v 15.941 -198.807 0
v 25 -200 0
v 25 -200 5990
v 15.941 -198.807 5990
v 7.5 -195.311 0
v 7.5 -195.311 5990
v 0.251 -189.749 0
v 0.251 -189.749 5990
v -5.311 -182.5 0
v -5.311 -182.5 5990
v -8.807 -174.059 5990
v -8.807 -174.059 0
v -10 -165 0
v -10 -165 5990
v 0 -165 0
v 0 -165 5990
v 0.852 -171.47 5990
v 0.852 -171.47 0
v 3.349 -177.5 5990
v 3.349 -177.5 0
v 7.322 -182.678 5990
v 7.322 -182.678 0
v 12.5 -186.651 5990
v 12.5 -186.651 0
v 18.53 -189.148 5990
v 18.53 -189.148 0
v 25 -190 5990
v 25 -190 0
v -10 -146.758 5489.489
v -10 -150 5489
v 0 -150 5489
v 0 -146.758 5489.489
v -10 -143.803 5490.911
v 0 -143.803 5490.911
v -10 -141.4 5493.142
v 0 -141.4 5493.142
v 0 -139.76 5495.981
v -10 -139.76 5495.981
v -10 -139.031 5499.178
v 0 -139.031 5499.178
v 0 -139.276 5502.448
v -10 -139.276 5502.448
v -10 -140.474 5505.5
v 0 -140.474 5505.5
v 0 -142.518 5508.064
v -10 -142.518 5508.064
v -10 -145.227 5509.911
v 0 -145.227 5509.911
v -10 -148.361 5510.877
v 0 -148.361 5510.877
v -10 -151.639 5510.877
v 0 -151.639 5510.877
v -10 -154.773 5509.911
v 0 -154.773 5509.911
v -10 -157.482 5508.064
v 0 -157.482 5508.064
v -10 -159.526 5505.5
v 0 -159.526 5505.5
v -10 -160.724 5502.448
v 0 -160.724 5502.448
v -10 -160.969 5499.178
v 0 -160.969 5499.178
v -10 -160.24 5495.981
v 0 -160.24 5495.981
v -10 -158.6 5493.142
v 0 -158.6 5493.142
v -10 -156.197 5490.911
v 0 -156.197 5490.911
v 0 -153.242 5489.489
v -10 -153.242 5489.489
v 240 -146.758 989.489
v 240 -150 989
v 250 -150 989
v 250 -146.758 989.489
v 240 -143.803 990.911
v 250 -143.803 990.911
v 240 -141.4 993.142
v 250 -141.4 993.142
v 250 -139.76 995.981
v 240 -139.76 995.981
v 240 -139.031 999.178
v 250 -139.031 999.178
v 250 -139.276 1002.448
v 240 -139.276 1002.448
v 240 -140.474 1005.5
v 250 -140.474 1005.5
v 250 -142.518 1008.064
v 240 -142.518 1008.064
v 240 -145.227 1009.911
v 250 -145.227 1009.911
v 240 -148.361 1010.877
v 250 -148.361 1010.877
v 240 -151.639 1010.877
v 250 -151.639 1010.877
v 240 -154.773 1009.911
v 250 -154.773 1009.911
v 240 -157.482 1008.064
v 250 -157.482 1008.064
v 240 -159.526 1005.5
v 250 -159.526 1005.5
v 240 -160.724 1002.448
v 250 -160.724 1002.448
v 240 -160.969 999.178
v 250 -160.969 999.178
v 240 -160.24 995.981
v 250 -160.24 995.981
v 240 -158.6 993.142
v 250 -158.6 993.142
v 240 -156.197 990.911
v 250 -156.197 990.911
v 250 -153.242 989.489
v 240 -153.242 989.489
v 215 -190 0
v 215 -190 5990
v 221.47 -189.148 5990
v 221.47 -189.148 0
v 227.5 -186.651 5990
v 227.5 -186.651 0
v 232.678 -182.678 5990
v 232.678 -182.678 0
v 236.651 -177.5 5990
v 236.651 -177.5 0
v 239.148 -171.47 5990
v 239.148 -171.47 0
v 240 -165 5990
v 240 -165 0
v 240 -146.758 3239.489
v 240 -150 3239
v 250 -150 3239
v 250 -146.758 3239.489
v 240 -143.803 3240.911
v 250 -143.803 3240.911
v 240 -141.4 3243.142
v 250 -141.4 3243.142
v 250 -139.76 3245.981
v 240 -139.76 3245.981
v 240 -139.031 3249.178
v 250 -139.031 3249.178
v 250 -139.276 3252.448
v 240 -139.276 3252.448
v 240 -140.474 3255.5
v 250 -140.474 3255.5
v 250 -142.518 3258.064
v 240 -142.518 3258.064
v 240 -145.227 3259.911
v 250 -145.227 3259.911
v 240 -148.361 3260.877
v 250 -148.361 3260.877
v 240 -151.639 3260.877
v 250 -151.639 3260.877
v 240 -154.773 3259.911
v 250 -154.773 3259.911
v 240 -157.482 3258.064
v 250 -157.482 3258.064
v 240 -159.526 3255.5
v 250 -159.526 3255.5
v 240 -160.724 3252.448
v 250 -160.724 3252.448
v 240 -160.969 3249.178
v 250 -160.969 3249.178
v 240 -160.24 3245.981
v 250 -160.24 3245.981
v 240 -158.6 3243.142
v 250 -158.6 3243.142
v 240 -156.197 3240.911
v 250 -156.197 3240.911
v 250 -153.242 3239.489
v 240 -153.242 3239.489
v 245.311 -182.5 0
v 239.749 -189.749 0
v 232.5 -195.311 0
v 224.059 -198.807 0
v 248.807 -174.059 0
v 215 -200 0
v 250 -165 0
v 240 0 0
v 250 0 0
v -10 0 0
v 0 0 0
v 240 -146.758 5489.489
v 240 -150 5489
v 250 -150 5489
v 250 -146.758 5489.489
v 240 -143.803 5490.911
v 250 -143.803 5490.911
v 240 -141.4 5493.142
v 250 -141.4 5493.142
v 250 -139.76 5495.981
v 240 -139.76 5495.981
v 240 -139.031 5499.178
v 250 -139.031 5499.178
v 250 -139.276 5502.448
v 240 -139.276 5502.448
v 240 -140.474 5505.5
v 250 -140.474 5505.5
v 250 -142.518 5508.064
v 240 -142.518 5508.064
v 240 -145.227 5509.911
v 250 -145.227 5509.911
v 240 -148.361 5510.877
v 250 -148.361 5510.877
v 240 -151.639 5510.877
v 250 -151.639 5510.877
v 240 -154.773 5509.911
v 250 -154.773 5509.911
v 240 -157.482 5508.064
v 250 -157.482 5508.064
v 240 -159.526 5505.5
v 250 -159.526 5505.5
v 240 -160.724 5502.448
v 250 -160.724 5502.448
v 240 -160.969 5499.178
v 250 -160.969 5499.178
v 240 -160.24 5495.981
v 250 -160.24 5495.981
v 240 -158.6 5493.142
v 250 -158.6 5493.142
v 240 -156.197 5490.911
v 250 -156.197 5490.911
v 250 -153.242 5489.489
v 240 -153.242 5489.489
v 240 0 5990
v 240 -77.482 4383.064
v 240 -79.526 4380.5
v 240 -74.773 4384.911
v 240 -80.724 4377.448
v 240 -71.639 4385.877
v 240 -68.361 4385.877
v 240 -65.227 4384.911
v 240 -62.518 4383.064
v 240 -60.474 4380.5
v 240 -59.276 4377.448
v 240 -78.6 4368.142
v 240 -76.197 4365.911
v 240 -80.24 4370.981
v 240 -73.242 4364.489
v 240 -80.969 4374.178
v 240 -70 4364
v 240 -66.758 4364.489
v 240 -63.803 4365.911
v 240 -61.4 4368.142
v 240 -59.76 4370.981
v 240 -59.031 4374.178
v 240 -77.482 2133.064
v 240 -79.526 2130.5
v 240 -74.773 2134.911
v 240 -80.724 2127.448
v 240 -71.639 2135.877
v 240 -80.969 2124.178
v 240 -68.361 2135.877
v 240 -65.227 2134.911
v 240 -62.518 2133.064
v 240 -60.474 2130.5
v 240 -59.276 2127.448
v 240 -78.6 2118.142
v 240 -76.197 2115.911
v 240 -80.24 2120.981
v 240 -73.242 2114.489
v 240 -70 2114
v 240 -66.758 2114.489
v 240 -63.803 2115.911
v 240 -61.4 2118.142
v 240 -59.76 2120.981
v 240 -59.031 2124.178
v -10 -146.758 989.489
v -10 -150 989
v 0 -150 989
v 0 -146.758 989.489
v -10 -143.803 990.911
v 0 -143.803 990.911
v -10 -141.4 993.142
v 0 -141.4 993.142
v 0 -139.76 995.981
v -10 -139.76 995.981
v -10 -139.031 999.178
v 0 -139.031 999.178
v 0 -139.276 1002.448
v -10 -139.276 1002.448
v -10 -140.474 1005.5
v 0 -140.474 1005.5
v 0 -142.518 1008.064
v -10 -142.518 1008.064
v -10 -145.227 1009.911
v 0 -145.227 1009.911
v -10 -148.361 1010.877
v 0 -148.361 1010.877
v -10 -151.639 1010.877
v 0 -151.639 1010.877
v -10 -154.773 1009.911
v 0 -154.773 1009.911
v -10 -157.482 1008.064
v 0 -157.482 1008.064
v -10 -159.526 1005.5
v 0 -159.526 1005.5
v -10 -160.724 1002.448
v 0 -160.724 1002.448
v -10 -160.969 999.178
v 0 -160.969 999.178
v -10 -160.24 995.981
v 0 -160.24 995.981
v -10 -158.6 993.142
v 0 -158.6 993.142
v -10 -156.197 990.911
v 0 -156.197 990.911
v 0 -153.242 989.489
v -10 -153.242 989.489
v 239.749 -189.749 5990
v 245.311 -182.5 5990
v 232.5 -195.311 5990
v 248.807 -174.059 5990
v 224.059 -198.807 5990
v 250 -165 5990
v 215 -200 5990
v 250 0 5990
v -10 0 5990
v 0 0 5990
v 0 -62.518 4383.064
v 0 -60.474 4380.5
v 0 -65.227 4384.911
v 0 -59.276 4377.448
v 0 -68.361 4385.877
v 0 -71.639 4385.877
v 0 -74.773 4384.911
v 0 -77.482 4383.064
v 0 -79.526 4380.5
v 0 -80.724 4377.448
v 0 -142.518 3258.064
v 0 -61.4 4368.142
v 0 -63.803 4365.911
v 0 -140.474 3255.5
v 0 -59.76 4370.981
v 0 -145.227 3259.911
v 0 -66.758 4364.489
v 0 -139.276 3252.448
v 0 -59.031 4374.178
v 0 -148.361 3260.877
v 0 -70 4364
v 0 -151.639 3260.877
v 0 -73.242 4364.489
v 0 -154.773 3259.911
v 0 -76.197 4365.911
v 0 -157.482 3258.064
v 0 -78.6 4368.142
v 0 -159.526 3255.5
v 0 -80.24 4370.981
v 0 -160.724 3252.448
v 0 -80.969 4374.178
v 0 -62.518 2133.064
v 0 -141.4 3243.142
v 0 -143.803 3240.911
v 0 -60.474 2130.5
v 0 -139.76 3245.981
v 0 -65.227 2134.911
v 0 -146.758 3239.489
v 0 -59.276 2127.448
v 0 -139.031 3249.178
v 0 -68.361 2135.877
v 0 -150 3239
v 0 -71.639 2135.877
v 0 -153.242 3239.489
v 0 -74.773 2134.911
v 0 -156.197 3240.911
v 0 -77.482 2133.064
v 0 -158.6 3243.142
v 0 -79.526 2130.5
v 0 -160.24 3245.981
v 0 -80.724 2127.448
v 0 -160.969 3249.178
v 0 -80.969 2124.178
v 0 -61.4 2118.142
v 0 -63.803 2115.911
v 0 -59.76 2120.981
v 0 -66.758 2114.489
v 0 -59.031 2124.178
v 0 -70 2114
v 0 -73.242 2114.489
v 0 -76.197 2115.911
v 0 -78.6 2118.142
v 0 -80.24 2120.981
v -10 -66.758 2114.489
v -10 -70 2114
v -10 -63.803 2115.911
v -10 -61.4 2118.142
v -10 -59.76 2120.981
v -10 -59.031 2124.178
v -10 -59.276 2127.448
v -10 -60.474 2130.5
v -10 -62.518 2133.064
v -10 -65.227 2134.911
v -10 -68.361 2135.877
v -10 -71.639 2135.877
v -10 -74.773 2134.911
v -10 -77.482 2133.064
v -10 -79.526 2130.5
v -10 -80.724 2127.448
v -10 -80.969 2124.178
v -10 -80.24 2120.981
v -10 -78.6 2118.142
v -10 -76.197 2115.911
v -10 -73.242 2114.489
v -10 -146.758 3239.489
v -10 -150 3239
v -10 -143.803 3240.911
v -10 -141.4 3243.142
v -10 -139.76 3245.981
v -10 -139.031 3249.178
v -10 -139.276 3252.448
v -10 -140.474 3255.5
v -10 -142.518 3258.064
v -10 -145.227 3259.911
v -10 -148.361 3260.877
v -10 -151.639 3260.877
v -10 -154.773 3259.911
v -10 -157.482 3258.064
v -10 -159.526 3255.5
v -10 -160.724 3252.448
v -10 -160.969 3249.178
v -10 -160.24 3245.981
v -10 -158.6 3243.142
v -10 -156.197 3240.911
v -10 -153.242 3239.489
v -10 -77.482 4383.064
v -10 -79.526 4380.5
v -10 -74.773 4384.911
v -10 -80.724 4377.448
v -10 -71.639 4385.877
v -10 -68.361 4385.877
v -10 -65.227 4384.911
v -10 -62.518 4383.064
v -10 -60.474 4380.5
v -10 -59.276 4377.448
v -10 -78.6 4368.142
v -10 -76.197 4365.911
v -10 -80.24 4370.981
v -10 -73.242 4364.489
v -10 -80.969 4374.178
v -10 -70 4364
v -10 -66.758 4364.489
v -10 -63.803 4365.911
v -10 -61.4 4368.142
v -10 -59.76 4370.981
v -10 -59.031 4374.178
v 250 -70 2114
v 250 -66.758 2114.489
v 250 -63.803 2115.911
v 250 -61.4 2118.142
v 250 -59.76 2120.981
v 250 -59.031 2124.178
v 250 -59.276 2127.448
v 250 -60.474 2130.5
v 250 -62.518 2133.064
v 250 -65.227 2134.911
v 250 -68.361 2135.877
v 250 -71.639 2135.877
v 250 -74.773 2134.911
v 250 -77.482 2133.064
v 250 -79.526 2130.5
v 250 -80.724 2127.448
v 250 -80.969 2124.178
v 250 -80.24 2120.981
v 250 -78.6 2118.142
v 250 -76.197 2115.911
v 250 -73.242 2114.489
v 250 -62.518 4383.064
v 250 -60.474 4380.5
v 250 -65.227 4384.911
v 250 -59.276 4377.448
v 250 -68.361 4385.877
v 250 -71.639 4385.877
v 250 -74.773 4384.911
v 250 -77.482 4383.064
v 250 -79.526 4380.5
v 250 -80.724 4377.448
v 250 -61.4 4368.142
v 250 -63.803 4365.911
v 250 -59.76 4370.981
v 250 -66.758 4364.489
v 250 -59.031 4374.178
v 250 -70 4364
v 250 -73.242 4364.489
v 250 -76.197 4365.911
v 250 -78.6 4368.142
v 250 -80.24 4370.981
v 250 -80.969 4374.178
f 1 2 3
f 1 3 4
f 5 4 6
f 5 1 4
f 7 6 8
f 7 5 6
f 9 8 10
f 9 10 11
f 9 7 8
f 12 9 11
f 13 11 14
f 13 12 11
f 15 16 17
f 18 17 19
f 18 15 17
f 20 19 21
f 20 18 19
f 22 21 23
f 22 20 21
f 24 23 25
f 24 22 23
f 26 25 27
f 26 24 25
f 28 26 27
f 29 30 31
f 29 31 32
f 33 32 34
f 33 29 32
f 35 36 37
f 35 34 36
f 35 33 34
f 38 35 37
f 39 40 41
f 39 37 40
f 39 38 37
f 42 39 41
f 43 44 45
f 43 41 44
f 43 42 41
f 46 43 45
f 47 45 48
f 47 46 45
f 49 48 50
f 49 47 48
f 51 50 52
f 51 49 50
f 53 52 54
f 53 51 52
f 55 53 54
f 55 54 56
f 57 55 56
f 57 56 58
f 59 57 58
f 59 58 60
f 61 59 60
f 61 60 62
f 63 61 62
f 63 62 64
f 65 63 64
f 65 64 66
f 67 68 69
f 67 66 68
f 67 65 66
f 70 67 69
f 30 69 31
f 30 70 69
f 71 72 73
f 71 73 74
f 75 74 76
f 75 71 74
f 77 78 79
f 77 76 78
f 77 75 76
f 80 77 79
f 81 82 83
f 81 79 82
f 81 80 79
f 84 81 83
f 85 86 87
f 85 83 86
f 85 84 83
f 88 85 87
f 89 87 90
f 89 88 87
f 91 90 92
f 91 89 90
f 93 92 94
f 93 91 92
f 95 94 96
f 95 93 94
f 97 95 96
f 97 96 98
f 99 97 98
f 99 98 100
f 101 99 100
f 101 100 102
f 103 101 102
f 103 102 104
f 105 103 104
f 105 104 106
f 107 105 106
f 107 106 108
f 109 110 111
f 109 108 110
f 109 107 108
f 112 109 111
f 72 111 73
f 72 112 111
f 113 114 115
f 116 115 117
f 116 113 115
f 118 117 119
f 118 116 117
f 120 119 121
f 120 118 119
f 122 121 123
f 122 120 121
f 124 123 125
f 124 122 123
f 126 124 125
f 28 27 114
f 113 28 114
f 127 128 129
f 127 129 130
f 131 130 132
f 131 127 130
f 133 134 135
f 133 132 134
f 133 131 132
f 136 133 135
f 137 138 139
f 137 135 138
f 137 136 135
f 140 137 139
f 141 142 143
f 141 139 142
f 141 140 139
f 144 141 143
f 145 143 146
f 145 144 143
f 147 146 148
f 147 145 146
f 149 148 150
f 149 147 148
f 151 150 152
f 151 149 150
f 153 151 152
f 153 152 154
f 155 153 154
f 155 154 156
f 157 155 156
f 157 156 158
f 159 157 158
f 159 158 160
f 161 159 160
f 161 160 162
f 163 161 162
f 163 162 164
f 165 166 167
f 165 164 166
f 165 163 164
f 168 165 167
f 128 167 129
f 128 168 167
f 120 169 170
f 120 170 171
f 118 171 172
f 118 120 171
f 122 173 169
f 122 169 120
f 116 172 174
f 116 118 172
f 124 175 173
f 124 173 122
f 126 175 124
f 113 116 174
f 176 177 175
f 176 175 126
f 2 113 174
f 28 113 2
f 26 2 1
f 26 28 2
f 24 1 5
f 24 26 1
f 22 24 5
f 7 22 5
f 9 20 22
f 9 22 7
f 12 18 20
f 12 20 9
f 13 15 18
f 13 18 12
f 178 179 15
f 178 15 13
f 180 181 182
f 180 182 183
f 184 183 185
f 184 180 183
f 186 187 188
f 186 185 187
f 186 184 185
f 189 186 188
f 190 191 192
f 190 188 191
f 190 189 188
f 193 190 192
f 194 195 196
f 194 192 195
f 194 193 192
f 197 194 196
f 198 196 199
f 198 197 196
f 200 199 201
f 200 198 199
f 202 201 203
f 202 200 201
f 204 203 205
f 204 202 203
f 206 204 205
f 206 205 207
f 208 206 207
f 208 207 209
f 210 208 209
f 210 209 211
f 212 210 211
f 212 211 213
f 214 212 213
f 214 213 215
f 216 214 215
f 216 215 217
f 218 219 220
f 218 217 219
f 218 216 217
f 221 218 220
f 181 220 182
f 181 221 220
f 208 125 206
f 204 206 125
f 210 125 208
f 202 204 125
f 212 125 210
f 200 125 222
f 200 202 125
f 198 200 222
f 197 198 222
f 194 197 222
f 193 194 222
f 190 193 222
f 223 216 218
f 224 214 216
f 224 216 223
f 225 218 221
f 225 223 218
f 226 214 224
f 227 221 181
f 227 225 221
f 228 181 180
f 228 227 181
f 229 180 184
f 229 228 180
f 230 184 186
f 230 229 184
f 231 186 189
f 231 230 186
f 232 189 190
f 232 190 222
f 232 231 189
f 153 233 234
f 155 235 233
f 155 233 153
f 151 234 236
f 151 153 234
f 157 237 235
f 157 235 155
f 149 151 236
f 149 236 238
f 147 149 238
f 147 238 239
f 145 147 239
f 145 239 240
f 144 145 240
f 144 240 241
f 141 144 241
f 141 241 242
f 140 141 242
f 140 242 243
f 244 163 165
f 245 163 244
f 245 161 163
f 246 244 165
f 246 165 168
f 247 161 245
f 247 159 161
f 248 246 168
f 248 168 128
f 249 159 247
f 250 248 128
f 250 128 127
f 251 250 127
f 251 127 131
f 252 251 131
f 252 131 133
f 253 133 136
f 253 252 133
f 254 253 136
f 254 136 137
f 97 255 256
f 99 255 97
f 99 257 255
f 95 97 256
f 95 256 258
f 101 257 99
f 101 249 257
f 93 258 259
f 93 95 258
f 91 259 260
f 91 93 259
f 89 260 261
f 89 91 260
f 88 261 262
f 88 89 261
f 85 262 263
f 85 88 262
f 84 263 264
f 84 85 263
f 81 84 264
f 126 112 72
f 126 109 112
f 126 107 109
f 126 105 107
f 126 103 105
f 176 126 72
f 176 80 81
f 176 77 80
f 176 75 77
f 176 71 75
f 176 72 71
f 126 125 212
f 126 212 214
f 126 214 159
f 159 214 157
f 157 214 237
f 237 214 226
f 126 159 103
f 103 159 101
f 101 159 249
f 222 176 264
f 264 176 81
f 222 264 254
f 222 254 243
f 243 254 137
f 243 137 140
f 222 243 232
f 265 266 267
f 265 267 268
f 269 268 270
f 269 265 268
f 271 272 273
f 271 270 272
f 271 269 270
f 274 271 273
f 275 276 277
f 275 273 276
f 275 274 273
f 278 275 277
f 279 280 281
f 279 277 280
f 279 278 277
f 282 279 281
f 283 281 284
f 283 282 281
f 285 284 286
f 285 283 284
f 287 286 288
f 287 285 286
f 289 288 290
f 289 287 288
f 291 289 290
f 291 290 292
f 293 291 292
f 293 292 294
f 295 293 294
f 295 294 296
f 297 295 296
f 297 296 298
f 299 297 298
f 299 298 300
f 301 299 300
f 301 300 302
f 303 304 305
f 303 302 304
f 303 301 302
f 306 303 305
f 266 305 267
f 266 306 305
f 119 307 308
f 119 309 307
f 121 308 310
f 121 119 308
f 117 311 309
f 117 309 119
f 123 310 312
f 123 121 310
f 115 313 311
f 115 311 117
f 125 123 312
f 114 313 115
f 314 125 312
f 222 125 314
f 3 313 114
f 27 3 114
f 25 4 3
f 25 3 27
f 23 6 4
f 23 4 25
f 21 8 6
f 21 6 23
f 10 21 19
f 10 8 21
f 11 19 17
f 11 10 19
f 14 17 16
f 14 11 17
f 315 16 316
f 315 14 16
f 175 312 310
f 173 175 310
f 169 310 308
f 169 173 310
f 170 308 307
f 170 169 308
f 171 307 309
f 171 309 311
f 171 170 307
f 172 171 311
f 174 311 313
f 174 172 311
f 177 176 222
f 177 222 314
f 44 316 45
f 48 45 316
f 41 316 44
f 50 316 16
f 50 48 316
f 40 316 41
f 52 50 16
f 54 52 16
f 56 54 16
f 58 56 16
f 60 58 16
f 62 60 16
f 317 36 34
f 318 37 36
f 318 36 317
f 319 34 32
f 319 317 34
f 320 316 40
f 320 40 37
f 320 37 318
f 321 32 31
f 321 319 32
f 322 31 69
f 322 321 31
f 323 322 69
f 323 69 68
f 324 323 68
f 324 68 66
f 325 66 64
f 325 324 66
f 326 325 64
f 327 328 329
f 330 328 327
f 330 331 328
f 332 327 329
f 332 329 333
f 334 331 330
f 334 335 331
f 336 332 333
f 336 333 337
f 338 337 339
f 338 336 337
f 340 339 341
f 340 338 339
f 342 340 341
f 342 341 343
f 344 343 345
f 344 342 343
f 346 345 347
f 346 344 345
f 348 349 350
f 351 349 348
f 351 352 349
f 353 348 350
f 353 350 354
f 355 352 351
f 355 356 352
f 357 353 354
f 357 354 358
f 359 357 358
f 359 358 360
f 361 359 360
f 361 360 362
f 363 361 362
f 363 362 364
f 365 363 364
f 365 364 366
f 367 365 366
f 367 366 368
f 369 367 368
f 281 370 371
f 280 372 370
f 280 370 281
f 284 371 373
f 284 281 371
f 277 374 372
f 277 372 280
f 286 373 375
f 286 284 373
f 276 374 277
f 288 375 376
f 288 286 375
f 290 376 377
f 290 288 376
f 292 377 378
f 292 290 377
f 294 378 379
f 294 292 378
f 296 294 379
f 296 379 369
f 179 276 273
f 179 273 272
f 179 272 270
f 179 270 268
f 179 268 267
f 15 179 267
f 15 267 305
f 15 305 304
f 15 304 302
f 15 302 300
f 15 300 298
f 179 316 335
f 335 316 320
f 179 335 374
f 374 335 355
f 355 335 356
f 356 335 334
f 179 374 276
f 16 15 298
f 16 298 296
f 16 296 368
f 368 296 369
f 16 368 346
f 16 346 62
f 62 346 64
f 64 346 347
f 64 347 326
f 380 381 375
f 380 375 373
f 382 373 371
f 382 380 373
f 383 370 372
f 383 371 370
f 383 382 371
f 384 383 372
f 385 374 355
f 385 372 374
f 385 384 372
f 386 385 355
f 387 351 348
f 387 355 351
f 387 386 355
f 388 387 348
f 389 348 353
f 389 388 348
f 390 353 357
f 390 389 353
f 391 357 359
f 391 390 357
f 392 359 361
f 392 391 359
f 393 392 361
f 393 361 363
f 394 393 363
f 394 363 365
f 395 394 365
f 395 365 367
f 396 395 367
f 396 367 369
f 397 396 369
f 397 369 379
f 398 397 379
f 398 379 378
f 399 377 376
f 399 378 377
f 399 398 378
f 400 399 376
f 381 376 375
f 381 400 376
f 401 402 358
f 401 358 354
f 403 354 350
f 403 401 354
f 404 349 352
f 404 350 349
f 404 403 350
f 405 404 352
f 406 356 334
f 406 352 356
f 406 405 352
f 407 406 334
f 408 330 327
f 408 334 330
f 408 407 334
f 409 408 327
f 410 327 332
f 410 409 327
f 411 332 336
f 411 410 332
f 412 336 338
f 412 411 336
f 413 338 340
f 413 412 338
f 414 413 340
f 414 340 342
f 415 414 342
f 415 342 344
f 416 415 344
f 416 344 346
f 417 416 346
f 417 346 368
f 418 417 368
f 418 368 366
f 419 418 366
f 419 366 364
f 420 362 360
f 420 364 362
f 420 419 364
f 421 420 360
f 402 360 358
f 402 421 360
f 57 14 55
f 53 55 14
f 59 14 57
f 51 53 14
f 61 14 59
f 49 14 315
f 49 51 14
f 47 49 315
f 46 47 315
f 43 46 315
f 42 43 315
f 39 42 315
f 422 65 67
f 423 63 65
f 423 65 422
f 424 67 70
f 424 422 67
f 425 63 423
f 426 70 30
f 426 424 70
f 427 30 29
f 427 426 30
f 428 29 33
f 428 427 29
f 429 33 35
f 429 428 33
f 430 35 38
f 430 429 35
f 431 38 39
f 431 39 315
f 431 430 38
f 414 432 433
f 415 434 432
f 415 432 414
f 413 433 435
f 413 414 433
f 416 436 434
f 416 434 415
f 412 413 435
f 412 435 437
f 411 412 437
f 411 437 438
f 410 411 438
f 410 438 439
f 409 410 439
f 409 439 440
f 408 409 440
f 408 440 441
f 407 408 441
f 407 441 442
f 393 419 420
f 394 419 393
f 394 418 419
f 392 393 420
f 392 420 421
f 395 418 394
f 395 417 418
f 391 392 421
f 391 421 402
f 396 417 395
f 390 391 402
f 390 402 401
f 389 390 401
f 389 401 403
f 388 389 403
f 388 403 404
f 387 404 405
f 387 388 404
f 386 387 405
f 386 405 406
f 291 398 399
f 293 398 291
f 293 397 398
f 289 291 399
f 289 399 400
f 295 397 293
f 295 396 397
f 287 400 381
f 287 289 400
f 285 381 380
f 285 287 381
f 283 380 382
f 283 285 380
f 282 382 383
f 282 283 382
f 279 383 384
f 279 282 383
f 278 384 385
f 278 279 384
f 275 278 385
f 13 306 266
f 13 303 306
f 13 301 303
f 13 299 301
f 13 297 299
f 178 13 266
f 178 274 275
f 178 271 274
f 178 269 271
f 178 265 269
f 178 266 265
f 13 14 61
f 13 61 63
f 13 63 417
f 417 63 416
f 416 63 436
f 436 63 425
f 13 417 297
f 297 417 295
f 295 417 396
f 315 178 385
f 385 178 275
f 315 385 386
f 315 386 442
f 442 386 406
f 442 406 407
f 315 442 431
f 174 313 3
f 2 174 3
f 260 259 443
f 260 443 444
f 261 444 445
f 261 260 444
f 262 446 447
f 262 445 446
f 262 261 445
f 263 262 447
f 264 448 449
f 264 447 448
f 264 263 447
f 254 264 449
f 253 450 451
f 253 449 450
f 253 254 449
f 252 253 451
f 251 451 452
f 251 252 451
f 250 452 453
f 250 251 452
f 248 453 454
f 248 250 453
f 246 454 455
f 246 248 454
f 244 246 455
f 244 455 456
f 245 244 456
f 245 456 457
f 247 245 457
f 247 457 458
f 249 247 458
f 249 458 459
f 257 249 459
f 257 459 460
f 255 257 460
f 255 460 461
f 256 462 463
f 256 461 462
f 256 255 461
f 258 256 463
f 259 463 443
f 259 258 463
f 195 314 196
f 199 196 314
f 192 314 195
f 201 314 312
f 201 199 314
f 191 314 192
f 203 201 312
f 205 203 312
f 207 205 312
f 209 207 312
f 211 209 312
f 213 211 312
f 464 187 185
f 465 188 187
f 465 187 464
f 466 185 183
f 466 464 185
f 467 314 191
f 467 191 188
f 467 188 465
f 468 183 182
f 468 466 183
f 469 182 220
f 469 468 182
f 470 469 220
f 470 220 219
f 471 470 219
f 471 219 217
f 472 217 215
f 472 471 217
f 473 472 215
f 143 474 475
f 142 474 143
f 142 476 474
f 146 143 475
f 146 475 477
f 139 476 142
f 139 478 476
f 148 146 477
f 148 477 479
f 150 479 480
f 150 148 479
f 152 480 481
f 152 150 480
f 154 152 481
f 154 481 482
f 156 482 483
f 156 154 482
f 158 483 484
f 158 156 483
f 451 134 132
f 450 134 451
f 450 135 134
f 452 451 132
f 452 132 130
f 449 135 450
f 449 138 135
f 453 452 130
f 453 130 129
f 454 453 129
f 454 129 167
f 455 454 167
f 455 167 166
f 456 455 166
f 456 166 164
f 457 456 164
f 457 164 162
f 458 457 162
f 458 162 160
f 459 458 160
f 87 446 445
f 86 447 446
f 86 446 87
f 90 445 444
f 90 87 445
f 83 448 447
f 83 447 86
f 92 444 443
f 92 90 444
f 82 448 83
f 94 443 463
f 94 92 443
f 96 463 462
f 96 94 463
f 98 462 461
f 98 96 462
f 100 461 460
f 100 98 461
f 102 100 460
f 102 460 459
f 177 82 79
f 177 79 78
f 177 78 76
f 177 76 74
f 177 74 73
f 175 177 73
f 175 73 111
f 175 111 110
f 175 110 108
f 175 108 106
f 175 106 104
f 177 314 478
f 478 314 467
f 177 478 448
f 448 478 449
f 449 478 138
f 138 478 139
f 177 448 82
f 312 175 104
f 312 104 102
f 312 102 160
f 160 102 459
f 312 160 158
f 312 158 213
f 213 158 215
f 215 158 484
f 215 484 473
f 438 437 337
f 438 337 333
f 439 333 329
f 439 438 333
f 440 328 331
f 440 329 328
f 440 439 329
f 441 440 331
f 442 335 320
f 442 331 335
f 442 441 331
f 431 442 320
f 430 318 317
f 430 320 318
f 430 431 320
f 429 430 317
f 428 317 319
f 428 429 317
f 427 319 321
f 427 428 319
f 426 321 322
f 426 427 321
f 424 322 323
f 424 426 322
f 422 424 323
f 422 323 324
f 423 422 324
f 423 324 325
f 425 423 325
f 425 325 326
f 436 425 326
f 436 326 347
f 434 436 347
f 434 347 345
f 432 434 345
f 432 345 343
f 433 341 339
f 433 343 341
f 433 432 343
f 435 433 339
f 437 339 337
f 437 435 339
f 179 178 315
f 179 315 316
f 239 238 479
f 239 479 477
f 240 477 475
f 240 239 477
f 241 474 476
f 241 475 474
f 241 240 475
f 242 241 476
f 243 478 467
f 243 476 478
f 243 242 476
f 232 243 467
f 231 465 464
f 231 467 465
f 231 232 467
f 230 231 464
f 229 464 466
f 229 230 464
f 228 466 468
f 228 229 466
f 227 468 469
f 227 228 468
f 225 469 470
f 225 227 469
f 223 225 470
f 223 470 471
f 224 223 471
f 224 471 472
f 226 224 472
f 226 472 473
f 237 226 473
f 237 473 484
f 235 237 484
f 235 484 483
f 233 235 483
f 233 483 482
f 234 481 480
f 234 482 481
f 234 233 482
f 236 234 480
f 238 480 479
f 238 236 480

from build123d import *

# Parameters (mm, degrees)
TABAN_FLAN_1_DEPTH         = 6500
KES_EKSTR_ZYON1_DEPTH      = 6509.271659972
KES_EKSTR_ZYON1_DEPTH_BACK = 6509.271659972
IZIM6_R                    = 11
IZIM6_W                    = 510
IZIM6_H                    = 200


# Sheet-metal steps are written as plain solids
with BuildPart() as part:
    # Çizim1 → Taban-Flanş1 (new body)
    with BuildSketch(Plane.XY):
        with BuildLine():
            Line((0, 0), (0, -165))
            ThreePointArc((0, -165), (7.32233047, -182.67766953), (25, -190))
            Line((25, -190), (215, -190))
            ThreePointArc((215, -190), (232.67766953, -182.67766953), (240, -165))
            Line((240, -165), (240, 0))
            Line((240, 0), (250, 0))
            Line((250, 0), (250, -165))
            ThreePointArc((250, -165), (239.748737342, -189.748737342), (215, -200))
            Line((215, -200), (25, -200))
            ThreePointArc((25, -200), (0.251262658, -189.748737342), (-10, -165))
            Line((-10, -165), (-10, 0))
            Line((-10, 0), (0, 0))
        make_face()
    extrude(amount=TABAN_FLAN_1_DEPTH)

    # Çizim6 → Kes-Ekstrüzyon1 (cut, two sides: drawn at the far end of the back side and taken through both)
    with BuildSketch(Plane(origin=(250, 0, 0), x_dir=(0, 0, -1), z_dir=(1, 0, 0)).offset(-KES_EKSTR_ZYON1_DEPTH_BACK)):
        with Locations((-1000, -150)):
            Circle(IZIM6_R)
        with Locations((-3250, -150)):
            Circle(IZIM6_R)
        with Locations((-5500, -150)):
            Circle(IZIM6_R)
        with Locations((-2125, -70)):
            Circle(IZIM6_R)
        with Locations((-4375, -70)):
            Circle(IZIM6_R)
        with Locations((-6245, -100)):
            Rectangle(IZIM6_W, IZIM6_H)
    extrude(amount=KES_EKSTR_ZYON1_DEPTH + KES_EKSTR_ZYON1_DEPTH_BACK, mode=Mode.SUBTRACT)


solid = part.part
